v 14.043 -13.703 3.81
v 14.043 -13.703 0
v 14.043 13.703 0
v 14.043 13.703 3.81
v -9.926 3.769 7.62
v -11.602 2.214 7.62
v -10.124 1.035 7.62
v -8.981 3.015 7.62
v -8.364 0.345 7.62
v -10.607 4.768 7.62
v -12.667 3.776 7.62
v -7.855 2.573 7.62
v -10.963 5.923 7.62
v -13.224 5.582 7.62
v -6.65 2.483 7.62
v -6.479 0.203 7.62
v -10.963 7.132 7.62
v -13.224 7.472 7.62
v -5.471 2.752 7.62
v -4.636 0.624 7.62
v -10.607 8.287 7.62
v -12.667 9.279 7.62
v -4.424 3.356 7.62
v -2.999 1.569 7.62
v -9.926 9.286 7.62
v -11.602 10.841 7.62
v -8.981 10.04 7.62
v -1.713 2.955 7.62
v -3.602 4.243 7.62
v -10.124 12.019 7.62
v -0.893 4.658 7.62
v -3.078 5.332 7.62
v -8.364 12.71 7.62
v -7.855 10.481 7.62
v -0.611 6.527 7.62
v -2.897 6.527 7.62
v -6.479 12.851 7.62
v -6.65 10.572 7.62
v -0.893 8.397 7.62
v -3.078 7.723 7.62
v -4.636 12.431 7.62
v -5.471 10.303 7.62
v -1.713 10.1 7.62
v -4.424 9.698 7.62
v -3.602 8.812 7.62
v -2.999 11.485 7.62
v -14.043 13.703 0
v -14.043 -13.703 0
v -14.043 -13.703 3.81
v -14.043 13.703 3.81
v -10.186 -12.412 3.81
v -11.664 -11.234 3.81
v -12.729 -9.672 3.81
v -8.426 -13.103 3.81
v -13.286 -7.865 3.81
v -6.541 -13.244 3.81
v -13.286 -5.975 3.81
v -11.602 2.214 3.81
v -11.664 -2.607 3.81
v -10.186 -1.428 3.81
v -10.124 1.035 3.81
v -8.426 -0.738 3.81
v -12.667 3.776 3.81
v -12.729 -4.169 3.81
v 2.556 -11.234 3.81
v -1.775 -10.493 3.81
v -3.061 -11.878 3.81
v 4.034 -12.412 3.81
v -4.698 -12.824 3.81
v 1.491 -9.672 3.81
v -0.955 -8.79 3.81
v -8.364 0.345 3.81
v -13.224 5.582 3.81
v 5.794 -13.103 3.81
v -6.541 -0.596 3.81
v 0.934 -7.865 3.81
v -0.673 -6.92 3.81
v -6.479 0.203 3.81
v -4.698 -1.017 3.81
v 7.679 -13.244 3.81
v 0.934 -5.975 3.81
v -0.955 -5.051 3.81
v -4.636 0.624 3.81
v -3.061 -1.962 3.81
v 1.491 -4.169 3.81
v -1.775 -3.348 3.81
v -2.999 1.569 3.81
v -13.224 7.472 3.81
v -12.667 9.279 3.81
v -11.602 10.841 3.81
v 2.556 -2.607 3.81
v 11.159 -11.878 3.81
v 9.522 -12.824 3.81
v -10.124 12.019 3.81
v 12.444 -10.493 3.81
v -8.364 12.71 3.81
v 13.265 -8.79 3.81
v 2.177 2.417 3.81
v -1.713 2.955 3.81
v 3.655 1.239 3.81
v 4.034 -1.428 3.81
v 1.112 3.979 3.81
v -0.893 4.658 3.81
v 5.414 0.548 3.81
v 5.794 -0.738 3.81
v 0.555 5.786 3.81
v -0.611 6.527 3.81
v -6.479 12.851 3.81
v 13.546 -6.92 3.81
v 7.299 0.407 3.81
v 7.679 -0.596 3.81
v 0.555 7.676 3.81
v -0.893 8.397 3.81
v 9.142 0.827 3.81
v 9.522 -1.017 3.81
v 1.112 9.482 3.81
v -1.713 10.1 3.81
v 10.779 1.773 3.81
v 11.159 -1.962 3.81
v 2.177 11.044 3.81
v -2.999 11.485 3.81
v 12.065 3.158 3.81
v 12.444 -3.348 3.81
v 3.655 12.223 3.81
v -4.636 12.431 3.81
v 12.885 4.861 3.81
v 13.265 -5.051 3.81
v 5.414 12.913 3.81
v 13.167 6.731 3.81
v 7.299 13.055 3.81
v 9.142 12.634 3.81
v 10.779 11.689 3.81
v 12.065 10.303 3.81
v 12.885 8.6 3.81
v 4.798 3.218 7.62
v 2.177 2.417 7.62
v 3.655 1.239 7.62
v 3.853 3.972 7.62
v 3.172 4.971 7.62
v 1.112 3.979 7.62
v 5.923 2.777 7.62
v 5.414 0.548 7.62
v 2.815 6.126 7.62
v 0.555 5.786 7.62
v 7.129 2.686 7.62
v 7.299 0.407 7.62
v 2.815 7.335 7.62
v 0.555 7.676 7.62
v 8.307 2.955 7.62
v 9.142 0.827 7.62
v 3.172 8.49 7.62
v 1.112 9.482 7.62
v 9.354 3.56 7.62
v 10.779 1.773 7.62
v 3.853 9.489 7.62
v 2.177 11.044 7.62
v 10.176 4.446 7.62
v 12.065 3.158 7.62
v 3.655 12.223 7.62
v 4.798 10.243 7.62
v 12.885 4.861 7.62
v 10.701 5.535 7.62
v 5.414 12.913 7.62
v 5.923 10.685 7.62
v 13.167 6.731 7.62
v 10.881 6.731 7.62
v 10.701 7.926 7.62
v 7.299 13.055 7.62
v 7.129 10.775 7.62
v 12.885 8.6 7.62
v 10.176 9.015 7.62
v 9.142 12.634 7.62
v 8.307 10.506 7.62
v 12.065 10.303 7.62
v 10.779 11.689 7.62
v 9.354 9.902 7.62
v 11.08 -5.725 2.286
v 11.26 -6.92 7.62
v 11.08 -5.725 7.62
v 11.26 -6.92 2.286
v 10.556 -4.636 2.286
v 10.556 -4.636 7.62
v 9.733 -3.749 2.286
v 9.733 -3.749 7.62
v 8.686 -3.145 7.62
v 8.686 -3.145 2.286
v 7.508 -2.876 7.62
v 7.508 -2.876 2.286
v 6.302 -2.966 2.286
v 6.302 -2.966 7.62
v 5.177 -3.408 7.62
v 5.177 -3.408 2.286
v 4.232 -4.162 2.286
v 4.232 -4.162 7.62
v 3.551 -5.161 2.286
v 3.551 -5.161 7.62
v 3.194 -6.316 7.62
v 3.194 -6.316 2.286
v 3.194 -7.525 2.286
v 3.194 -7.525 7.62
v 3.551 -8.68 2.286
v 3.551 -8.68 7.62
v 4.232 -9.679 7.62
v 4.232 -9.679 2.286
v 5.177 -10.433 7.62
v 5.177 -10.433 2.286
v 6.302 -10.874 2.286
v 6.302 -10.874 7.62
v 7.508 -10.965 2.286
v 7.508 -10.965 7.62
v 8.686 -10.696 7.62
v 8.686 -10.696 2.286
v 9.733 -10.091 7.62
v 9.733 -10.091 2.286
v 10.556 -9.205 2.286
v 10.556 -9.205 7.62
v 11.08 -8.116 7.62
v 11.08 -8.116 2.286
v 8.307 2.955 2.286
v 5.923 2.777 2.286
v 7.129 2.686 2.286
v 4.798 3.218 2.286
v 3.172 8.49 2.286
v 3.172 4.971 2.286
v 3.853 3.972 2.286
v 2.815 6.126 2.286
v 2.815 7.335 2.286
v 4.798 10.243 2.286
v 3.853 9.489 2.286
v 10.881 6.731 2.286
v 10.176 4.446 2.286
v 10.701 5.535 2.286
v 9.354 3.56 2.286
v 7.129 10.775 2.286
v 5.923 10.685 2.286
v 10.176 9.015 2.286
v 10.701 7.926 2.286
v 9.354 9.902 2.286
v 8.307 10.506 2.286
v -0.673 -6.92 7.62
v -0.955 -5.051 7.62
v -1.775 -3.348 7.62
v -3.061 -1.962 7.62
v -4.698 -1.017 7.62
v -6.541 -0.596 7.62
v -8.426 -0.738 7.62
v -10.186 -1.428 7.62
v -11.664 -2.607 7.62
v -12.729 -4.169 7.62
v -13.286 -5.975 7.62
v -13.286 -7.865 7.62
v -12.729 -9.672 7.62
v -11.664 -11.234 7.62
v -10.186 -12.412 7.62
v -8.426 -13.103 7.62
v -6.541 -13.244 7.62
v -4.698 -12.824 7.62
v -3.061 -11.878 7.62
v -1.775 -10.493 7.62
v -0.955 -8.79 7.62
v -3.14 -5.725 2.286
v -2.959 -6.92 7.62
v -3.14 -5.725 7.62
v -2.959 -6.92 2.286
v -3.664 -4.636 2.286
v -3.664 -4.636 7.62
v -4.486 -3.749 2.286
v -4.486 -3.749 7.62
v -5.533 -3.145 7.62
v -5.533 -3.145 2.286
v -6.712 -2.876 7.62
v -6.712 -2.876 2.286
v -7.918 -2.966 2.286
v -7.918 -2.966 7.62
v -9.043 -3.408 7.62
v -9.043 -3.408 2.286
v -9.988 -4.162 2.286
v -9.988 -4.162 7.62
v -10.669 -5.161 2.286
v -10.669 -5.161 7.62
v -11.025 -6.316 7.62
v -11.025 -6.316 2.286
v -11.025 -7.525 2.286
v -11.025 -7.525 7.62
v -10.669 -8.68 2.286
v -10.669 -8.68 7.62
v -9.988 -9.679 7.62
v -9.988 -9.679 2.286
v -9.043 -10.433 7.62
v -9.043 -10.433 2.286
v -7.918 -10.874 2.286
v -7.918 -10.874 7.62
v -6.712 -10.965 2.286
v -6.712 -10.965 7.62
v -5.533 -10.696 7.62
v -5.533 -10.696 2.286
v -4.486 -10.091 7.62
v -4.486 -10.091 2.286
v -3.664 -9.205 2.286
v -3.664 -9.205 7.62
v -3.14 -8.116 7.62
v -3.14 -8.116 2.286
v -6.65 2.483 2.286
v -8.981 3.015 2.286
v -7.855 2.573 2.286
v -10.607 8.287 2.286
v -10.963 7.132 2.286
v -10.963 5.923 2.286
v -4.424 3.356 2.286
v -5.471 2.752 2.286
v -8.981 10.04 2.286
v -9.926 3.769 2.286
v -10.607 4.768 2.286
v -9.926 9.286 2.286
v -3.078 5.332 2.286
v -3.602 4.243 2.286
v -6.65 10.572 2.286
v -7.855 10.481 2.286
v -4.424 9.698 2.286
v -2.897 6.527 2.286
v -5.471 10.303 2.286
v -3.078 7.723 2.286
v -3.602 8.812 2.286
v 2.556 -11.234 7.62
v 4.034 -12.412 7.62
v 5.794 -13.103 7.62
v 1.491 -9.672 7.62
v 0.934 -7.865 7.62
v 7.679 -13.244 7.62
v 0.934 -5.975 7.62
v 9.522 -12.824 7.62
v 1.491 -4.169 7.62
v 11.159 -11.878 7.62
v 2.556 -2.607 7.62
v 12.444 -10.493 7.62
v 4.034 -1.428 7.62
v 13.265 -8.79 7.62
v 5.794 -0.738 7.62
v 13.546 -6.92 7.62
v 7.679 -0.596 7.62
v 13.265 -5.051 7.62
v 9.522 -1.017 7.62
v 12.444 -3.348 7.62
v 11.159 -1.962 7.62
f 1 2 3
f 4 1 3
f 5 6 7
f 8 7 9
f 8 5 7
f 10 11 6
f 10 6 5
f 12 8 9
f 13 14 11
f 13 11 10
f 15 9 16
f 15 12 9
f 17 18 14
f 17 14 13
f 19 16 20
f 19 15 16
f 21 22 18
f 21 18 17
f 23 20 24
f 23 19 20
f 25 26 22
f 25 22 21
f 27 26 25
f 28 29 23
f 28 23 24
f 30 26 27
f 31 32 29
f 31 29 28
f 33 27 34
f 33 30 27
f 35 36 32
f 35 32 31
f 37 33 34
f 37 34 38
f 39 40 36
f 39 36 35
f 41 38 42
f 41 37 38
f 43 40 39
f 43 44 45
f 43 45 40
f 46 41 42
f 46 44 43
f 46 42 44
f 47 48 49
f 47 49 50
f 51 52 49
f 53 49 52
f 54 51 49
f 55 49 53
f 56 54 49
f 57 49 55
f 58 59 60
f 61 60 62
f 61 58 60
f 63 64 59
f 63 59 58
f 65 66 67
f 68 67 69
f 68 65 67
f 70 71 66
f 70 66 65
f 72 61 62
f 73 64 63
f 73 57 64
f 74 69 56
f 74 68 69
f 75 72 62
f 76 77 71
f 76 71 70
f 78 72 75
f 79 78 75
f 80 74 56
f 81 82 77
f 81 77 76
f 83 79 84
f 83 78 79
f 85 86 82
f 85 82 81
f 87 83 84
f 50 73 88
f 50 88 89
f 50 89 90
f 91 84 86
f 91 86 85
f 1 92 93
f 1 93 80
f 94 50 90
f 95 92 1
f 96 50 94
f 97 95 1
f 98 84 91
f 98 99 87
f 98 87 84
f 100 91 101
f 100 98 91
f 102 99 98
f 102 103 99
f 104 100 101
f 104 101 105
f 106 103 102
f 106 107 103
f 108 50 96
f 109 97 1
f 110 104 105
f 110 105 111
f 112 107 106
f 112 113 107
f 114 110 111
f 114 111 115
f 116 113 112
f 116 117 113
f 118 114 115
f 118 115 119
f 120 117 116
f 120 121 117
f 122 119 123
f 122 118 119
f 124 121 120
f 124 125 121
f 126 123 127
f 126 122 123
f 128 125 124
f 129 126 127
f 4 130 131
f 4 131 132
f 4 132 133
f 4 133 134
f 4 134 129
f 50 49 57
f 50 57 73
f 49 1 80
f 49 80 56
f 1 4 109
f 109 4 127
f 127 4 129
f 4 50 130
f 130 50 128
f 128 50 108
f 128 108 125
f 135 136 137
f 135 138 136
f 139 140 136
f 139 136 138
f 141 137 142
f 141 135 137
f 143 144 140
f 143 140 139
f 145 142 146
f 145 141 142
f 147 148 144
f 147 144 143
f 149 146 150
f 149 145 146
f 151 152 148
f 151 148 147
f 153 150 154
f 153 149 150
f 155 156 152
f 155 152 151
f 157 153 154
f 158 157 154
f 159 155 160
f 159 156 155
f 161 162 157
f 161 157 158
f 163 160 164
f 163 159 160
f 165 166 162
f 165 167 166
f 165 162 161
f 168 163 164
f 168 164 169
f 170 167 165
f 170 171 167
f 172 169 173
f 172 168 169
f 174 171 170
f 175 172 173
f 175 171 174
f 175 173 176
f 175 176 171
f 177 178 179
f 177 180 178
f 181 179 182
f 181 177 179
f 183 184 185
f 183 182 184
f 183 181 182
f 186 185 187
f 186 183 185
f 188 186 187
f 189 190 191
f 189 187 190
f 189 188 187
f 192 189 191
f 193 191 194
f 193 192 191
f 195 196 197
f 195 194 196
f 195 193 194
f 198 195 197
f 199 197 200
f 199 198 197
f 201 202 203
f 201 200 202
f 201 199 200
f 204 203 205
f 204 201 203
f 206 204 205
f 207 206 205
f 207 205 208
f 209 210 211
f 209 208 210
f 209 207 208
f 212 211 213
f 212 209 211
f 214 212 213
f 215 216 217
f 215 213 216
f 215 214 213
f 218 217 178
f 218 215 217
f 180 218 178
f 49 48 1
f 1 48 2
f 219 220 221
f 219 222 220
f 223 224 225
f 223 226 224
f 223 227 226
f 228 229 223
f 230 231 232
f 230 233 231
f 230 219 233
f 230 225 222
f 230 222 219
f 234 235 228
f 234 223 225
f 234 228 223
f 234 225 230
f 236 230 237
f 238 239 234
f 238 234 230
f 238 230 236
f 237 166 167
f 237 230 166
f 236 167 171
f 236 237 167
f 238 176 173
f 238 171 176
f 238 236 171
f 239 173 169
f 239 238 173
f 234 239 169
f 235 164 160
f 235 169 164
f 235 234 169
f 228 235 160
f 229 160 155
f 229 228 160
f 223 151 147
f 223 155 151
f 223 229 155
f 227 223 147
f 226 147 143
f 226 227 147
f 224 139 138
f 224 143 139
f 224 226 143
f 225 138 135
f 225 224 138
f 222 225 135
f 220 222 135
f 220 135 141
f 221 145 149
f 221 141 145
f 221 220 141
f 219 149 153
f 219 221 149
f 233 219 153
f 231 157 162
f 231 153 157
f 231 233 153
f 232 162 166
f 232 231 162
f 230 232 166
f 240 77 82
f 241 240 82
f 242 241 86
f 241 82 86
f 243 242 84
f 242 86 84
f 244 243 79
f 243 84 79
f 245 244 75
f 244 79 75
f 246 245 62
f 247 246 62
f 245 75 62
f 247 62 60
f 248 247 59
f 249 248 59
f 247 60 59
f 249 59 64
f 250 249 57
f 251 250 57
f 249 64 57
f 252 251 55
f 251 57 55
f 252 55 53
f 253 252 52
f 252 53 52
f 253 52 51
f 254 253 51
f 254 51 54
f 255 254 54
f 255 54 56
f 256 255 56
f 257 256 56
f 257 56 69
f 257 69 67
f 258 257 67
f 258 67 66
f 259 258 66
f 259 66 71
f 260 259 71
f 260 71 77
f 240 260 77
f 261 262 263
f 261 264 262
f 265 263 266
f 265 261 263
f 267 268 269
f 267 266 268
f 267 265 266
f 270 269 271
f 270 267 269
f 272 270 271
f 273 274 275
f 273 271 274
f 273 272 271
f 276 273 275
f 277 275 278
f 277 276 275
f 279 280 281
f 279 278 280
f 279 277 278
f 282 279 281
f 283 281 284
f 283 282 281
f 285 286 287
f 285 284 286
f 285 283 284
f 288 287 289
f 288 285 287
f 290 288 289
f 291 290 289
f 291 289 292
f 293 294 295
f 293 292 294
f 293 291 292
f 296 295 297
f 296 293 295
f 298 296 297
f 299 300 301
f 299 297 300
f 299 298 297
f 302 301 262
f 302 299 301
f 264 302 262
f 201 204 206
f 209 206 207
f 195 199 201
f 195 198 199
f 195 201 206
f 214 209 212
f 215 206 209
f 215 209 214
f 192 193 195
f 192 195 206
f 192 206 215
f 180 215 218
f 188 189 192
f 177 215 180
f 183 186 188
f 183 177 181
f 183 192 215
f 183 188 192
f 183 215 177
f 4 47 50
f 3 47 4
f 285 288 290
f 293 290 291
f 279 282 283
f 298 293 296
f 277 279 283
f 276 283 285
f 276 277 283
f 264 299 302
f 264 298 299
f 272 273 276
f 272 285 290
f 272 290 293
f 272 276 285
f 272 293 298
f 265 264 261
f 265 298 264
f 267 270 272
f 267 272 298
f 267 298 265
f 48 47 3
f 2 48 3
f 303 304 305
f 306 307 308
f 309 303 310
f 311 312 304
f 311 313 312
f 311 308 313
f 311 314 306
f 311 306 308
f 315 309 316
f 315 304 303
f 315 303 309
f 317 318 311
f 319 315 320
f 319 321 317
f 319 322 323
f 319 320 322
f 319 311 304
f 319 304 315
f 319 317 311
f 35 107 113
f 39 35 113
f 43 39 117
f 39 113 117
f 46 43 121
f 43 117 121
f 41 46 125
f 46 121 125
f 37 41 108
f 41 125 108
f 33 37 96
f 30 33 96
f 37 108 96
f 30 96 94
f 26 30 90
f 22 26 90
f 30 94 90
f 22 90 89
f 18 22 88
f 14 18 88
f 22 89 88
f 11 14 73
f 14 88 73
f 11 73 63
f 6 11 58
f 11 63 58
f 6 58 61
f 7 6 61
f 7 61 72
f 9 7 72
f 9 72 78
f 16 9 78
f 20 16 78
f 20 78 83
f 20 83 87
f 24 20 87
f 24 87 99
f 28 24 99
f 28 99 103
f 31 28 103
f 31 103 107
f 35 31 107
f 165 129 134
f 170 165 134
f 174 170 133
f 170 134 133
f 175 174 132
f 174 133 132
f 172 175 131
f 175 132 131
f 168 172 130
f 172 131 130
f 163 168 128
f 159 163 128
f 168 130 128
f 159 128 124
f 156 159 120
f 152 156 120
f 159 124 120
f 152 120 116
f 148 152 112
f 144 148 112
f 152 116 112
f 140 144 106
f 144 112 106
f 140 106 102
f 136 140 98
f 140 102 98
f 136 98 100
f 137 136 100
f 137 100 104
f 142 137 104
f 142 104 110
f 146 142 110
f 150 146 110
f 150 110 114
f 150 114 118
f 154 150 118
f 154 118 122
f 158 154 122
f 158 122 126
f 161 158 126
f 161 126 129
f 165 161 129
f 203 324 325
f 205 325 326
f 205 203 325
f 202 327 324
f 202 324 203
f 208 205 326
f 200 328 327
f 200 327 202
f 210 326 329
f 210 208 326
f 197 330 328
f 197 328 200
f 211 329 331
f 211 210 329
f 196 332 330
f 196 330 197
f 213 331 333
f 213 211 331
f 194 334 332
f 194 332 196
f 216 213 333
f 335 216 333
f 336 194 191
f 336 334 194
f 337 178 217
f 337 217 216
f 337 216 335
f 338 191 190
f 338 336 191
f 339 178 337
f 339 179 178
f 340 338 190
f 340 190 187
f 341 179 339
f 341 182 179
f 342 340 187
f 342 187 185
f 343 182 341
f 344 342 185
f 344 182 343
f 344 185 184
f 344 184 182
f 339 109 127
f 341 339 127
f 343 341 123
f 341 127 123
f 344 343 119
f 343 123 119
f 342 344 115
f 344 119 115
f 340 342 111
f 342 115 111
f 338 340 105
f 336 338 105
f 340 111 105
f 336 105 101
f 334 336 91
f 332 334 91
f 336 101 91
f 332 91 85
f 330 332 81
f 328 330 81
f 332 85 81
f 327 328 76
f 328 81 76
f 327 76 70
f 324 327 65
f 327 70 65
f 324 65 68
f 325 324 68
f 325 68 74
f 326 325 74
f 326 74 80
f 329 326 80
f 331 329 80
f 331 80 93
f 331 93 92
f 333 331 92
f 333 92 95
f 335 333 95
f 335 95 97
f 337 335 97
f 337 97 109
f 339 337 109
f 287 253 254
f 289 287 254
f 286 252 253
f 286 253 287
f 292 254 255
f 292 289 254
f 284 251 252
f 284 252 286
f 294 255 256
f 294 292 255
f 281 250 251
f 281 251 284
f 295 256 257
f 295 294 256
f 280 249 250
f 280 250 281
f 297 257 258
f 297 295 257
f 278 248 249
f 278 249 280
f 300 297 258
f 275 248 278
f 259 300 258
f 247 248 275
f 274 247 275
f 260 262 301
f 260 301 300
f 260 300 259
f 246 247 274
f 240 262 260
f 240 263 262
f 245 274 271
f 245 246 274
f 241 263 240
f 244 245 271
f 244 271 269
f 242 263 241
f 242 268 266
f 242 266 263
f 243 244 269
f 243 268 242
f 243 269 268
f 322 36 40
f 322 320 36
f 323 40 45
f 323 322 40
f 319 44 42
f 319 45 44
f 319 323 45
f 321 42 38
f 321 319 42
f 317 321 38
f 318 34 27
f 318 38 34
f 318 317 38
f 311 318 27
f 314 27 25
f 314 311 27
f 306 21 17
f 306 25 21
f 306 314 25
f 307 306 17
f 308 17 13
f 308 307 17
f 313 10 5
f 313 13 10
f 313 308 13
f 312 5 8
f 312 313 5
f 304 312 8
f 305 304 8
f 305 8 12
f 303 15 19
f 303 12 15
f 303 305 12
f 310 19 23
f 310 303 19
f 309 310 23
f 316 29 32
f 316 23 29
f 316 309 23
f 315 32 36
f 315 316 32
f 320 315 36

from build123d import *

# Parameters (mm, degrees)
F0_W     = 28.08589302
F0_H     = 27.4060983211
F1_DEPTH = 3.81
F2_R     = 6.3416120596
F3_DEPTH = 7.62
F4_T     = -2.286


with BuildPart() as f1:
    # F0 (on Top) → F1 (new body)
    with BuildSketch(Plane.XY):
        Rectangle(F0_W, F0_H)
    extrude(amount=F1_DEPTH)

    # F2 (on Top) → F3 (join)
    with BuildSketch(Plane.XY):
        with Locations((-6.9529586472, 6.5272971988)):
            Circle(F2_R)
        with Locations((6.8254987709, 6.7306994461)):
            Circle(F2_R)
        with Locations((7.2046923451, -6.9202962331)):
            Circle(F2_R)
        with Locations((-7.015094161, -6.9202962331)):
            Circle(F2_R)
    extrude(amount=F3_DEPTH)

    # F4
    f4_openings = [f1.faces().sort_by_distance(p)[0] for p in [
        (-6.952959, 6.527297, 7.62),
        (-7.015094, -6.920296, 7.62),
        (7.204692, -6.920296, 7.62),
        (6.825499, 6.730699, 7.62),
    ]]
    offset(amount=F4_T, openings=f4_openings, kind=Kind.INTERSECTION)


solid = f1.part
